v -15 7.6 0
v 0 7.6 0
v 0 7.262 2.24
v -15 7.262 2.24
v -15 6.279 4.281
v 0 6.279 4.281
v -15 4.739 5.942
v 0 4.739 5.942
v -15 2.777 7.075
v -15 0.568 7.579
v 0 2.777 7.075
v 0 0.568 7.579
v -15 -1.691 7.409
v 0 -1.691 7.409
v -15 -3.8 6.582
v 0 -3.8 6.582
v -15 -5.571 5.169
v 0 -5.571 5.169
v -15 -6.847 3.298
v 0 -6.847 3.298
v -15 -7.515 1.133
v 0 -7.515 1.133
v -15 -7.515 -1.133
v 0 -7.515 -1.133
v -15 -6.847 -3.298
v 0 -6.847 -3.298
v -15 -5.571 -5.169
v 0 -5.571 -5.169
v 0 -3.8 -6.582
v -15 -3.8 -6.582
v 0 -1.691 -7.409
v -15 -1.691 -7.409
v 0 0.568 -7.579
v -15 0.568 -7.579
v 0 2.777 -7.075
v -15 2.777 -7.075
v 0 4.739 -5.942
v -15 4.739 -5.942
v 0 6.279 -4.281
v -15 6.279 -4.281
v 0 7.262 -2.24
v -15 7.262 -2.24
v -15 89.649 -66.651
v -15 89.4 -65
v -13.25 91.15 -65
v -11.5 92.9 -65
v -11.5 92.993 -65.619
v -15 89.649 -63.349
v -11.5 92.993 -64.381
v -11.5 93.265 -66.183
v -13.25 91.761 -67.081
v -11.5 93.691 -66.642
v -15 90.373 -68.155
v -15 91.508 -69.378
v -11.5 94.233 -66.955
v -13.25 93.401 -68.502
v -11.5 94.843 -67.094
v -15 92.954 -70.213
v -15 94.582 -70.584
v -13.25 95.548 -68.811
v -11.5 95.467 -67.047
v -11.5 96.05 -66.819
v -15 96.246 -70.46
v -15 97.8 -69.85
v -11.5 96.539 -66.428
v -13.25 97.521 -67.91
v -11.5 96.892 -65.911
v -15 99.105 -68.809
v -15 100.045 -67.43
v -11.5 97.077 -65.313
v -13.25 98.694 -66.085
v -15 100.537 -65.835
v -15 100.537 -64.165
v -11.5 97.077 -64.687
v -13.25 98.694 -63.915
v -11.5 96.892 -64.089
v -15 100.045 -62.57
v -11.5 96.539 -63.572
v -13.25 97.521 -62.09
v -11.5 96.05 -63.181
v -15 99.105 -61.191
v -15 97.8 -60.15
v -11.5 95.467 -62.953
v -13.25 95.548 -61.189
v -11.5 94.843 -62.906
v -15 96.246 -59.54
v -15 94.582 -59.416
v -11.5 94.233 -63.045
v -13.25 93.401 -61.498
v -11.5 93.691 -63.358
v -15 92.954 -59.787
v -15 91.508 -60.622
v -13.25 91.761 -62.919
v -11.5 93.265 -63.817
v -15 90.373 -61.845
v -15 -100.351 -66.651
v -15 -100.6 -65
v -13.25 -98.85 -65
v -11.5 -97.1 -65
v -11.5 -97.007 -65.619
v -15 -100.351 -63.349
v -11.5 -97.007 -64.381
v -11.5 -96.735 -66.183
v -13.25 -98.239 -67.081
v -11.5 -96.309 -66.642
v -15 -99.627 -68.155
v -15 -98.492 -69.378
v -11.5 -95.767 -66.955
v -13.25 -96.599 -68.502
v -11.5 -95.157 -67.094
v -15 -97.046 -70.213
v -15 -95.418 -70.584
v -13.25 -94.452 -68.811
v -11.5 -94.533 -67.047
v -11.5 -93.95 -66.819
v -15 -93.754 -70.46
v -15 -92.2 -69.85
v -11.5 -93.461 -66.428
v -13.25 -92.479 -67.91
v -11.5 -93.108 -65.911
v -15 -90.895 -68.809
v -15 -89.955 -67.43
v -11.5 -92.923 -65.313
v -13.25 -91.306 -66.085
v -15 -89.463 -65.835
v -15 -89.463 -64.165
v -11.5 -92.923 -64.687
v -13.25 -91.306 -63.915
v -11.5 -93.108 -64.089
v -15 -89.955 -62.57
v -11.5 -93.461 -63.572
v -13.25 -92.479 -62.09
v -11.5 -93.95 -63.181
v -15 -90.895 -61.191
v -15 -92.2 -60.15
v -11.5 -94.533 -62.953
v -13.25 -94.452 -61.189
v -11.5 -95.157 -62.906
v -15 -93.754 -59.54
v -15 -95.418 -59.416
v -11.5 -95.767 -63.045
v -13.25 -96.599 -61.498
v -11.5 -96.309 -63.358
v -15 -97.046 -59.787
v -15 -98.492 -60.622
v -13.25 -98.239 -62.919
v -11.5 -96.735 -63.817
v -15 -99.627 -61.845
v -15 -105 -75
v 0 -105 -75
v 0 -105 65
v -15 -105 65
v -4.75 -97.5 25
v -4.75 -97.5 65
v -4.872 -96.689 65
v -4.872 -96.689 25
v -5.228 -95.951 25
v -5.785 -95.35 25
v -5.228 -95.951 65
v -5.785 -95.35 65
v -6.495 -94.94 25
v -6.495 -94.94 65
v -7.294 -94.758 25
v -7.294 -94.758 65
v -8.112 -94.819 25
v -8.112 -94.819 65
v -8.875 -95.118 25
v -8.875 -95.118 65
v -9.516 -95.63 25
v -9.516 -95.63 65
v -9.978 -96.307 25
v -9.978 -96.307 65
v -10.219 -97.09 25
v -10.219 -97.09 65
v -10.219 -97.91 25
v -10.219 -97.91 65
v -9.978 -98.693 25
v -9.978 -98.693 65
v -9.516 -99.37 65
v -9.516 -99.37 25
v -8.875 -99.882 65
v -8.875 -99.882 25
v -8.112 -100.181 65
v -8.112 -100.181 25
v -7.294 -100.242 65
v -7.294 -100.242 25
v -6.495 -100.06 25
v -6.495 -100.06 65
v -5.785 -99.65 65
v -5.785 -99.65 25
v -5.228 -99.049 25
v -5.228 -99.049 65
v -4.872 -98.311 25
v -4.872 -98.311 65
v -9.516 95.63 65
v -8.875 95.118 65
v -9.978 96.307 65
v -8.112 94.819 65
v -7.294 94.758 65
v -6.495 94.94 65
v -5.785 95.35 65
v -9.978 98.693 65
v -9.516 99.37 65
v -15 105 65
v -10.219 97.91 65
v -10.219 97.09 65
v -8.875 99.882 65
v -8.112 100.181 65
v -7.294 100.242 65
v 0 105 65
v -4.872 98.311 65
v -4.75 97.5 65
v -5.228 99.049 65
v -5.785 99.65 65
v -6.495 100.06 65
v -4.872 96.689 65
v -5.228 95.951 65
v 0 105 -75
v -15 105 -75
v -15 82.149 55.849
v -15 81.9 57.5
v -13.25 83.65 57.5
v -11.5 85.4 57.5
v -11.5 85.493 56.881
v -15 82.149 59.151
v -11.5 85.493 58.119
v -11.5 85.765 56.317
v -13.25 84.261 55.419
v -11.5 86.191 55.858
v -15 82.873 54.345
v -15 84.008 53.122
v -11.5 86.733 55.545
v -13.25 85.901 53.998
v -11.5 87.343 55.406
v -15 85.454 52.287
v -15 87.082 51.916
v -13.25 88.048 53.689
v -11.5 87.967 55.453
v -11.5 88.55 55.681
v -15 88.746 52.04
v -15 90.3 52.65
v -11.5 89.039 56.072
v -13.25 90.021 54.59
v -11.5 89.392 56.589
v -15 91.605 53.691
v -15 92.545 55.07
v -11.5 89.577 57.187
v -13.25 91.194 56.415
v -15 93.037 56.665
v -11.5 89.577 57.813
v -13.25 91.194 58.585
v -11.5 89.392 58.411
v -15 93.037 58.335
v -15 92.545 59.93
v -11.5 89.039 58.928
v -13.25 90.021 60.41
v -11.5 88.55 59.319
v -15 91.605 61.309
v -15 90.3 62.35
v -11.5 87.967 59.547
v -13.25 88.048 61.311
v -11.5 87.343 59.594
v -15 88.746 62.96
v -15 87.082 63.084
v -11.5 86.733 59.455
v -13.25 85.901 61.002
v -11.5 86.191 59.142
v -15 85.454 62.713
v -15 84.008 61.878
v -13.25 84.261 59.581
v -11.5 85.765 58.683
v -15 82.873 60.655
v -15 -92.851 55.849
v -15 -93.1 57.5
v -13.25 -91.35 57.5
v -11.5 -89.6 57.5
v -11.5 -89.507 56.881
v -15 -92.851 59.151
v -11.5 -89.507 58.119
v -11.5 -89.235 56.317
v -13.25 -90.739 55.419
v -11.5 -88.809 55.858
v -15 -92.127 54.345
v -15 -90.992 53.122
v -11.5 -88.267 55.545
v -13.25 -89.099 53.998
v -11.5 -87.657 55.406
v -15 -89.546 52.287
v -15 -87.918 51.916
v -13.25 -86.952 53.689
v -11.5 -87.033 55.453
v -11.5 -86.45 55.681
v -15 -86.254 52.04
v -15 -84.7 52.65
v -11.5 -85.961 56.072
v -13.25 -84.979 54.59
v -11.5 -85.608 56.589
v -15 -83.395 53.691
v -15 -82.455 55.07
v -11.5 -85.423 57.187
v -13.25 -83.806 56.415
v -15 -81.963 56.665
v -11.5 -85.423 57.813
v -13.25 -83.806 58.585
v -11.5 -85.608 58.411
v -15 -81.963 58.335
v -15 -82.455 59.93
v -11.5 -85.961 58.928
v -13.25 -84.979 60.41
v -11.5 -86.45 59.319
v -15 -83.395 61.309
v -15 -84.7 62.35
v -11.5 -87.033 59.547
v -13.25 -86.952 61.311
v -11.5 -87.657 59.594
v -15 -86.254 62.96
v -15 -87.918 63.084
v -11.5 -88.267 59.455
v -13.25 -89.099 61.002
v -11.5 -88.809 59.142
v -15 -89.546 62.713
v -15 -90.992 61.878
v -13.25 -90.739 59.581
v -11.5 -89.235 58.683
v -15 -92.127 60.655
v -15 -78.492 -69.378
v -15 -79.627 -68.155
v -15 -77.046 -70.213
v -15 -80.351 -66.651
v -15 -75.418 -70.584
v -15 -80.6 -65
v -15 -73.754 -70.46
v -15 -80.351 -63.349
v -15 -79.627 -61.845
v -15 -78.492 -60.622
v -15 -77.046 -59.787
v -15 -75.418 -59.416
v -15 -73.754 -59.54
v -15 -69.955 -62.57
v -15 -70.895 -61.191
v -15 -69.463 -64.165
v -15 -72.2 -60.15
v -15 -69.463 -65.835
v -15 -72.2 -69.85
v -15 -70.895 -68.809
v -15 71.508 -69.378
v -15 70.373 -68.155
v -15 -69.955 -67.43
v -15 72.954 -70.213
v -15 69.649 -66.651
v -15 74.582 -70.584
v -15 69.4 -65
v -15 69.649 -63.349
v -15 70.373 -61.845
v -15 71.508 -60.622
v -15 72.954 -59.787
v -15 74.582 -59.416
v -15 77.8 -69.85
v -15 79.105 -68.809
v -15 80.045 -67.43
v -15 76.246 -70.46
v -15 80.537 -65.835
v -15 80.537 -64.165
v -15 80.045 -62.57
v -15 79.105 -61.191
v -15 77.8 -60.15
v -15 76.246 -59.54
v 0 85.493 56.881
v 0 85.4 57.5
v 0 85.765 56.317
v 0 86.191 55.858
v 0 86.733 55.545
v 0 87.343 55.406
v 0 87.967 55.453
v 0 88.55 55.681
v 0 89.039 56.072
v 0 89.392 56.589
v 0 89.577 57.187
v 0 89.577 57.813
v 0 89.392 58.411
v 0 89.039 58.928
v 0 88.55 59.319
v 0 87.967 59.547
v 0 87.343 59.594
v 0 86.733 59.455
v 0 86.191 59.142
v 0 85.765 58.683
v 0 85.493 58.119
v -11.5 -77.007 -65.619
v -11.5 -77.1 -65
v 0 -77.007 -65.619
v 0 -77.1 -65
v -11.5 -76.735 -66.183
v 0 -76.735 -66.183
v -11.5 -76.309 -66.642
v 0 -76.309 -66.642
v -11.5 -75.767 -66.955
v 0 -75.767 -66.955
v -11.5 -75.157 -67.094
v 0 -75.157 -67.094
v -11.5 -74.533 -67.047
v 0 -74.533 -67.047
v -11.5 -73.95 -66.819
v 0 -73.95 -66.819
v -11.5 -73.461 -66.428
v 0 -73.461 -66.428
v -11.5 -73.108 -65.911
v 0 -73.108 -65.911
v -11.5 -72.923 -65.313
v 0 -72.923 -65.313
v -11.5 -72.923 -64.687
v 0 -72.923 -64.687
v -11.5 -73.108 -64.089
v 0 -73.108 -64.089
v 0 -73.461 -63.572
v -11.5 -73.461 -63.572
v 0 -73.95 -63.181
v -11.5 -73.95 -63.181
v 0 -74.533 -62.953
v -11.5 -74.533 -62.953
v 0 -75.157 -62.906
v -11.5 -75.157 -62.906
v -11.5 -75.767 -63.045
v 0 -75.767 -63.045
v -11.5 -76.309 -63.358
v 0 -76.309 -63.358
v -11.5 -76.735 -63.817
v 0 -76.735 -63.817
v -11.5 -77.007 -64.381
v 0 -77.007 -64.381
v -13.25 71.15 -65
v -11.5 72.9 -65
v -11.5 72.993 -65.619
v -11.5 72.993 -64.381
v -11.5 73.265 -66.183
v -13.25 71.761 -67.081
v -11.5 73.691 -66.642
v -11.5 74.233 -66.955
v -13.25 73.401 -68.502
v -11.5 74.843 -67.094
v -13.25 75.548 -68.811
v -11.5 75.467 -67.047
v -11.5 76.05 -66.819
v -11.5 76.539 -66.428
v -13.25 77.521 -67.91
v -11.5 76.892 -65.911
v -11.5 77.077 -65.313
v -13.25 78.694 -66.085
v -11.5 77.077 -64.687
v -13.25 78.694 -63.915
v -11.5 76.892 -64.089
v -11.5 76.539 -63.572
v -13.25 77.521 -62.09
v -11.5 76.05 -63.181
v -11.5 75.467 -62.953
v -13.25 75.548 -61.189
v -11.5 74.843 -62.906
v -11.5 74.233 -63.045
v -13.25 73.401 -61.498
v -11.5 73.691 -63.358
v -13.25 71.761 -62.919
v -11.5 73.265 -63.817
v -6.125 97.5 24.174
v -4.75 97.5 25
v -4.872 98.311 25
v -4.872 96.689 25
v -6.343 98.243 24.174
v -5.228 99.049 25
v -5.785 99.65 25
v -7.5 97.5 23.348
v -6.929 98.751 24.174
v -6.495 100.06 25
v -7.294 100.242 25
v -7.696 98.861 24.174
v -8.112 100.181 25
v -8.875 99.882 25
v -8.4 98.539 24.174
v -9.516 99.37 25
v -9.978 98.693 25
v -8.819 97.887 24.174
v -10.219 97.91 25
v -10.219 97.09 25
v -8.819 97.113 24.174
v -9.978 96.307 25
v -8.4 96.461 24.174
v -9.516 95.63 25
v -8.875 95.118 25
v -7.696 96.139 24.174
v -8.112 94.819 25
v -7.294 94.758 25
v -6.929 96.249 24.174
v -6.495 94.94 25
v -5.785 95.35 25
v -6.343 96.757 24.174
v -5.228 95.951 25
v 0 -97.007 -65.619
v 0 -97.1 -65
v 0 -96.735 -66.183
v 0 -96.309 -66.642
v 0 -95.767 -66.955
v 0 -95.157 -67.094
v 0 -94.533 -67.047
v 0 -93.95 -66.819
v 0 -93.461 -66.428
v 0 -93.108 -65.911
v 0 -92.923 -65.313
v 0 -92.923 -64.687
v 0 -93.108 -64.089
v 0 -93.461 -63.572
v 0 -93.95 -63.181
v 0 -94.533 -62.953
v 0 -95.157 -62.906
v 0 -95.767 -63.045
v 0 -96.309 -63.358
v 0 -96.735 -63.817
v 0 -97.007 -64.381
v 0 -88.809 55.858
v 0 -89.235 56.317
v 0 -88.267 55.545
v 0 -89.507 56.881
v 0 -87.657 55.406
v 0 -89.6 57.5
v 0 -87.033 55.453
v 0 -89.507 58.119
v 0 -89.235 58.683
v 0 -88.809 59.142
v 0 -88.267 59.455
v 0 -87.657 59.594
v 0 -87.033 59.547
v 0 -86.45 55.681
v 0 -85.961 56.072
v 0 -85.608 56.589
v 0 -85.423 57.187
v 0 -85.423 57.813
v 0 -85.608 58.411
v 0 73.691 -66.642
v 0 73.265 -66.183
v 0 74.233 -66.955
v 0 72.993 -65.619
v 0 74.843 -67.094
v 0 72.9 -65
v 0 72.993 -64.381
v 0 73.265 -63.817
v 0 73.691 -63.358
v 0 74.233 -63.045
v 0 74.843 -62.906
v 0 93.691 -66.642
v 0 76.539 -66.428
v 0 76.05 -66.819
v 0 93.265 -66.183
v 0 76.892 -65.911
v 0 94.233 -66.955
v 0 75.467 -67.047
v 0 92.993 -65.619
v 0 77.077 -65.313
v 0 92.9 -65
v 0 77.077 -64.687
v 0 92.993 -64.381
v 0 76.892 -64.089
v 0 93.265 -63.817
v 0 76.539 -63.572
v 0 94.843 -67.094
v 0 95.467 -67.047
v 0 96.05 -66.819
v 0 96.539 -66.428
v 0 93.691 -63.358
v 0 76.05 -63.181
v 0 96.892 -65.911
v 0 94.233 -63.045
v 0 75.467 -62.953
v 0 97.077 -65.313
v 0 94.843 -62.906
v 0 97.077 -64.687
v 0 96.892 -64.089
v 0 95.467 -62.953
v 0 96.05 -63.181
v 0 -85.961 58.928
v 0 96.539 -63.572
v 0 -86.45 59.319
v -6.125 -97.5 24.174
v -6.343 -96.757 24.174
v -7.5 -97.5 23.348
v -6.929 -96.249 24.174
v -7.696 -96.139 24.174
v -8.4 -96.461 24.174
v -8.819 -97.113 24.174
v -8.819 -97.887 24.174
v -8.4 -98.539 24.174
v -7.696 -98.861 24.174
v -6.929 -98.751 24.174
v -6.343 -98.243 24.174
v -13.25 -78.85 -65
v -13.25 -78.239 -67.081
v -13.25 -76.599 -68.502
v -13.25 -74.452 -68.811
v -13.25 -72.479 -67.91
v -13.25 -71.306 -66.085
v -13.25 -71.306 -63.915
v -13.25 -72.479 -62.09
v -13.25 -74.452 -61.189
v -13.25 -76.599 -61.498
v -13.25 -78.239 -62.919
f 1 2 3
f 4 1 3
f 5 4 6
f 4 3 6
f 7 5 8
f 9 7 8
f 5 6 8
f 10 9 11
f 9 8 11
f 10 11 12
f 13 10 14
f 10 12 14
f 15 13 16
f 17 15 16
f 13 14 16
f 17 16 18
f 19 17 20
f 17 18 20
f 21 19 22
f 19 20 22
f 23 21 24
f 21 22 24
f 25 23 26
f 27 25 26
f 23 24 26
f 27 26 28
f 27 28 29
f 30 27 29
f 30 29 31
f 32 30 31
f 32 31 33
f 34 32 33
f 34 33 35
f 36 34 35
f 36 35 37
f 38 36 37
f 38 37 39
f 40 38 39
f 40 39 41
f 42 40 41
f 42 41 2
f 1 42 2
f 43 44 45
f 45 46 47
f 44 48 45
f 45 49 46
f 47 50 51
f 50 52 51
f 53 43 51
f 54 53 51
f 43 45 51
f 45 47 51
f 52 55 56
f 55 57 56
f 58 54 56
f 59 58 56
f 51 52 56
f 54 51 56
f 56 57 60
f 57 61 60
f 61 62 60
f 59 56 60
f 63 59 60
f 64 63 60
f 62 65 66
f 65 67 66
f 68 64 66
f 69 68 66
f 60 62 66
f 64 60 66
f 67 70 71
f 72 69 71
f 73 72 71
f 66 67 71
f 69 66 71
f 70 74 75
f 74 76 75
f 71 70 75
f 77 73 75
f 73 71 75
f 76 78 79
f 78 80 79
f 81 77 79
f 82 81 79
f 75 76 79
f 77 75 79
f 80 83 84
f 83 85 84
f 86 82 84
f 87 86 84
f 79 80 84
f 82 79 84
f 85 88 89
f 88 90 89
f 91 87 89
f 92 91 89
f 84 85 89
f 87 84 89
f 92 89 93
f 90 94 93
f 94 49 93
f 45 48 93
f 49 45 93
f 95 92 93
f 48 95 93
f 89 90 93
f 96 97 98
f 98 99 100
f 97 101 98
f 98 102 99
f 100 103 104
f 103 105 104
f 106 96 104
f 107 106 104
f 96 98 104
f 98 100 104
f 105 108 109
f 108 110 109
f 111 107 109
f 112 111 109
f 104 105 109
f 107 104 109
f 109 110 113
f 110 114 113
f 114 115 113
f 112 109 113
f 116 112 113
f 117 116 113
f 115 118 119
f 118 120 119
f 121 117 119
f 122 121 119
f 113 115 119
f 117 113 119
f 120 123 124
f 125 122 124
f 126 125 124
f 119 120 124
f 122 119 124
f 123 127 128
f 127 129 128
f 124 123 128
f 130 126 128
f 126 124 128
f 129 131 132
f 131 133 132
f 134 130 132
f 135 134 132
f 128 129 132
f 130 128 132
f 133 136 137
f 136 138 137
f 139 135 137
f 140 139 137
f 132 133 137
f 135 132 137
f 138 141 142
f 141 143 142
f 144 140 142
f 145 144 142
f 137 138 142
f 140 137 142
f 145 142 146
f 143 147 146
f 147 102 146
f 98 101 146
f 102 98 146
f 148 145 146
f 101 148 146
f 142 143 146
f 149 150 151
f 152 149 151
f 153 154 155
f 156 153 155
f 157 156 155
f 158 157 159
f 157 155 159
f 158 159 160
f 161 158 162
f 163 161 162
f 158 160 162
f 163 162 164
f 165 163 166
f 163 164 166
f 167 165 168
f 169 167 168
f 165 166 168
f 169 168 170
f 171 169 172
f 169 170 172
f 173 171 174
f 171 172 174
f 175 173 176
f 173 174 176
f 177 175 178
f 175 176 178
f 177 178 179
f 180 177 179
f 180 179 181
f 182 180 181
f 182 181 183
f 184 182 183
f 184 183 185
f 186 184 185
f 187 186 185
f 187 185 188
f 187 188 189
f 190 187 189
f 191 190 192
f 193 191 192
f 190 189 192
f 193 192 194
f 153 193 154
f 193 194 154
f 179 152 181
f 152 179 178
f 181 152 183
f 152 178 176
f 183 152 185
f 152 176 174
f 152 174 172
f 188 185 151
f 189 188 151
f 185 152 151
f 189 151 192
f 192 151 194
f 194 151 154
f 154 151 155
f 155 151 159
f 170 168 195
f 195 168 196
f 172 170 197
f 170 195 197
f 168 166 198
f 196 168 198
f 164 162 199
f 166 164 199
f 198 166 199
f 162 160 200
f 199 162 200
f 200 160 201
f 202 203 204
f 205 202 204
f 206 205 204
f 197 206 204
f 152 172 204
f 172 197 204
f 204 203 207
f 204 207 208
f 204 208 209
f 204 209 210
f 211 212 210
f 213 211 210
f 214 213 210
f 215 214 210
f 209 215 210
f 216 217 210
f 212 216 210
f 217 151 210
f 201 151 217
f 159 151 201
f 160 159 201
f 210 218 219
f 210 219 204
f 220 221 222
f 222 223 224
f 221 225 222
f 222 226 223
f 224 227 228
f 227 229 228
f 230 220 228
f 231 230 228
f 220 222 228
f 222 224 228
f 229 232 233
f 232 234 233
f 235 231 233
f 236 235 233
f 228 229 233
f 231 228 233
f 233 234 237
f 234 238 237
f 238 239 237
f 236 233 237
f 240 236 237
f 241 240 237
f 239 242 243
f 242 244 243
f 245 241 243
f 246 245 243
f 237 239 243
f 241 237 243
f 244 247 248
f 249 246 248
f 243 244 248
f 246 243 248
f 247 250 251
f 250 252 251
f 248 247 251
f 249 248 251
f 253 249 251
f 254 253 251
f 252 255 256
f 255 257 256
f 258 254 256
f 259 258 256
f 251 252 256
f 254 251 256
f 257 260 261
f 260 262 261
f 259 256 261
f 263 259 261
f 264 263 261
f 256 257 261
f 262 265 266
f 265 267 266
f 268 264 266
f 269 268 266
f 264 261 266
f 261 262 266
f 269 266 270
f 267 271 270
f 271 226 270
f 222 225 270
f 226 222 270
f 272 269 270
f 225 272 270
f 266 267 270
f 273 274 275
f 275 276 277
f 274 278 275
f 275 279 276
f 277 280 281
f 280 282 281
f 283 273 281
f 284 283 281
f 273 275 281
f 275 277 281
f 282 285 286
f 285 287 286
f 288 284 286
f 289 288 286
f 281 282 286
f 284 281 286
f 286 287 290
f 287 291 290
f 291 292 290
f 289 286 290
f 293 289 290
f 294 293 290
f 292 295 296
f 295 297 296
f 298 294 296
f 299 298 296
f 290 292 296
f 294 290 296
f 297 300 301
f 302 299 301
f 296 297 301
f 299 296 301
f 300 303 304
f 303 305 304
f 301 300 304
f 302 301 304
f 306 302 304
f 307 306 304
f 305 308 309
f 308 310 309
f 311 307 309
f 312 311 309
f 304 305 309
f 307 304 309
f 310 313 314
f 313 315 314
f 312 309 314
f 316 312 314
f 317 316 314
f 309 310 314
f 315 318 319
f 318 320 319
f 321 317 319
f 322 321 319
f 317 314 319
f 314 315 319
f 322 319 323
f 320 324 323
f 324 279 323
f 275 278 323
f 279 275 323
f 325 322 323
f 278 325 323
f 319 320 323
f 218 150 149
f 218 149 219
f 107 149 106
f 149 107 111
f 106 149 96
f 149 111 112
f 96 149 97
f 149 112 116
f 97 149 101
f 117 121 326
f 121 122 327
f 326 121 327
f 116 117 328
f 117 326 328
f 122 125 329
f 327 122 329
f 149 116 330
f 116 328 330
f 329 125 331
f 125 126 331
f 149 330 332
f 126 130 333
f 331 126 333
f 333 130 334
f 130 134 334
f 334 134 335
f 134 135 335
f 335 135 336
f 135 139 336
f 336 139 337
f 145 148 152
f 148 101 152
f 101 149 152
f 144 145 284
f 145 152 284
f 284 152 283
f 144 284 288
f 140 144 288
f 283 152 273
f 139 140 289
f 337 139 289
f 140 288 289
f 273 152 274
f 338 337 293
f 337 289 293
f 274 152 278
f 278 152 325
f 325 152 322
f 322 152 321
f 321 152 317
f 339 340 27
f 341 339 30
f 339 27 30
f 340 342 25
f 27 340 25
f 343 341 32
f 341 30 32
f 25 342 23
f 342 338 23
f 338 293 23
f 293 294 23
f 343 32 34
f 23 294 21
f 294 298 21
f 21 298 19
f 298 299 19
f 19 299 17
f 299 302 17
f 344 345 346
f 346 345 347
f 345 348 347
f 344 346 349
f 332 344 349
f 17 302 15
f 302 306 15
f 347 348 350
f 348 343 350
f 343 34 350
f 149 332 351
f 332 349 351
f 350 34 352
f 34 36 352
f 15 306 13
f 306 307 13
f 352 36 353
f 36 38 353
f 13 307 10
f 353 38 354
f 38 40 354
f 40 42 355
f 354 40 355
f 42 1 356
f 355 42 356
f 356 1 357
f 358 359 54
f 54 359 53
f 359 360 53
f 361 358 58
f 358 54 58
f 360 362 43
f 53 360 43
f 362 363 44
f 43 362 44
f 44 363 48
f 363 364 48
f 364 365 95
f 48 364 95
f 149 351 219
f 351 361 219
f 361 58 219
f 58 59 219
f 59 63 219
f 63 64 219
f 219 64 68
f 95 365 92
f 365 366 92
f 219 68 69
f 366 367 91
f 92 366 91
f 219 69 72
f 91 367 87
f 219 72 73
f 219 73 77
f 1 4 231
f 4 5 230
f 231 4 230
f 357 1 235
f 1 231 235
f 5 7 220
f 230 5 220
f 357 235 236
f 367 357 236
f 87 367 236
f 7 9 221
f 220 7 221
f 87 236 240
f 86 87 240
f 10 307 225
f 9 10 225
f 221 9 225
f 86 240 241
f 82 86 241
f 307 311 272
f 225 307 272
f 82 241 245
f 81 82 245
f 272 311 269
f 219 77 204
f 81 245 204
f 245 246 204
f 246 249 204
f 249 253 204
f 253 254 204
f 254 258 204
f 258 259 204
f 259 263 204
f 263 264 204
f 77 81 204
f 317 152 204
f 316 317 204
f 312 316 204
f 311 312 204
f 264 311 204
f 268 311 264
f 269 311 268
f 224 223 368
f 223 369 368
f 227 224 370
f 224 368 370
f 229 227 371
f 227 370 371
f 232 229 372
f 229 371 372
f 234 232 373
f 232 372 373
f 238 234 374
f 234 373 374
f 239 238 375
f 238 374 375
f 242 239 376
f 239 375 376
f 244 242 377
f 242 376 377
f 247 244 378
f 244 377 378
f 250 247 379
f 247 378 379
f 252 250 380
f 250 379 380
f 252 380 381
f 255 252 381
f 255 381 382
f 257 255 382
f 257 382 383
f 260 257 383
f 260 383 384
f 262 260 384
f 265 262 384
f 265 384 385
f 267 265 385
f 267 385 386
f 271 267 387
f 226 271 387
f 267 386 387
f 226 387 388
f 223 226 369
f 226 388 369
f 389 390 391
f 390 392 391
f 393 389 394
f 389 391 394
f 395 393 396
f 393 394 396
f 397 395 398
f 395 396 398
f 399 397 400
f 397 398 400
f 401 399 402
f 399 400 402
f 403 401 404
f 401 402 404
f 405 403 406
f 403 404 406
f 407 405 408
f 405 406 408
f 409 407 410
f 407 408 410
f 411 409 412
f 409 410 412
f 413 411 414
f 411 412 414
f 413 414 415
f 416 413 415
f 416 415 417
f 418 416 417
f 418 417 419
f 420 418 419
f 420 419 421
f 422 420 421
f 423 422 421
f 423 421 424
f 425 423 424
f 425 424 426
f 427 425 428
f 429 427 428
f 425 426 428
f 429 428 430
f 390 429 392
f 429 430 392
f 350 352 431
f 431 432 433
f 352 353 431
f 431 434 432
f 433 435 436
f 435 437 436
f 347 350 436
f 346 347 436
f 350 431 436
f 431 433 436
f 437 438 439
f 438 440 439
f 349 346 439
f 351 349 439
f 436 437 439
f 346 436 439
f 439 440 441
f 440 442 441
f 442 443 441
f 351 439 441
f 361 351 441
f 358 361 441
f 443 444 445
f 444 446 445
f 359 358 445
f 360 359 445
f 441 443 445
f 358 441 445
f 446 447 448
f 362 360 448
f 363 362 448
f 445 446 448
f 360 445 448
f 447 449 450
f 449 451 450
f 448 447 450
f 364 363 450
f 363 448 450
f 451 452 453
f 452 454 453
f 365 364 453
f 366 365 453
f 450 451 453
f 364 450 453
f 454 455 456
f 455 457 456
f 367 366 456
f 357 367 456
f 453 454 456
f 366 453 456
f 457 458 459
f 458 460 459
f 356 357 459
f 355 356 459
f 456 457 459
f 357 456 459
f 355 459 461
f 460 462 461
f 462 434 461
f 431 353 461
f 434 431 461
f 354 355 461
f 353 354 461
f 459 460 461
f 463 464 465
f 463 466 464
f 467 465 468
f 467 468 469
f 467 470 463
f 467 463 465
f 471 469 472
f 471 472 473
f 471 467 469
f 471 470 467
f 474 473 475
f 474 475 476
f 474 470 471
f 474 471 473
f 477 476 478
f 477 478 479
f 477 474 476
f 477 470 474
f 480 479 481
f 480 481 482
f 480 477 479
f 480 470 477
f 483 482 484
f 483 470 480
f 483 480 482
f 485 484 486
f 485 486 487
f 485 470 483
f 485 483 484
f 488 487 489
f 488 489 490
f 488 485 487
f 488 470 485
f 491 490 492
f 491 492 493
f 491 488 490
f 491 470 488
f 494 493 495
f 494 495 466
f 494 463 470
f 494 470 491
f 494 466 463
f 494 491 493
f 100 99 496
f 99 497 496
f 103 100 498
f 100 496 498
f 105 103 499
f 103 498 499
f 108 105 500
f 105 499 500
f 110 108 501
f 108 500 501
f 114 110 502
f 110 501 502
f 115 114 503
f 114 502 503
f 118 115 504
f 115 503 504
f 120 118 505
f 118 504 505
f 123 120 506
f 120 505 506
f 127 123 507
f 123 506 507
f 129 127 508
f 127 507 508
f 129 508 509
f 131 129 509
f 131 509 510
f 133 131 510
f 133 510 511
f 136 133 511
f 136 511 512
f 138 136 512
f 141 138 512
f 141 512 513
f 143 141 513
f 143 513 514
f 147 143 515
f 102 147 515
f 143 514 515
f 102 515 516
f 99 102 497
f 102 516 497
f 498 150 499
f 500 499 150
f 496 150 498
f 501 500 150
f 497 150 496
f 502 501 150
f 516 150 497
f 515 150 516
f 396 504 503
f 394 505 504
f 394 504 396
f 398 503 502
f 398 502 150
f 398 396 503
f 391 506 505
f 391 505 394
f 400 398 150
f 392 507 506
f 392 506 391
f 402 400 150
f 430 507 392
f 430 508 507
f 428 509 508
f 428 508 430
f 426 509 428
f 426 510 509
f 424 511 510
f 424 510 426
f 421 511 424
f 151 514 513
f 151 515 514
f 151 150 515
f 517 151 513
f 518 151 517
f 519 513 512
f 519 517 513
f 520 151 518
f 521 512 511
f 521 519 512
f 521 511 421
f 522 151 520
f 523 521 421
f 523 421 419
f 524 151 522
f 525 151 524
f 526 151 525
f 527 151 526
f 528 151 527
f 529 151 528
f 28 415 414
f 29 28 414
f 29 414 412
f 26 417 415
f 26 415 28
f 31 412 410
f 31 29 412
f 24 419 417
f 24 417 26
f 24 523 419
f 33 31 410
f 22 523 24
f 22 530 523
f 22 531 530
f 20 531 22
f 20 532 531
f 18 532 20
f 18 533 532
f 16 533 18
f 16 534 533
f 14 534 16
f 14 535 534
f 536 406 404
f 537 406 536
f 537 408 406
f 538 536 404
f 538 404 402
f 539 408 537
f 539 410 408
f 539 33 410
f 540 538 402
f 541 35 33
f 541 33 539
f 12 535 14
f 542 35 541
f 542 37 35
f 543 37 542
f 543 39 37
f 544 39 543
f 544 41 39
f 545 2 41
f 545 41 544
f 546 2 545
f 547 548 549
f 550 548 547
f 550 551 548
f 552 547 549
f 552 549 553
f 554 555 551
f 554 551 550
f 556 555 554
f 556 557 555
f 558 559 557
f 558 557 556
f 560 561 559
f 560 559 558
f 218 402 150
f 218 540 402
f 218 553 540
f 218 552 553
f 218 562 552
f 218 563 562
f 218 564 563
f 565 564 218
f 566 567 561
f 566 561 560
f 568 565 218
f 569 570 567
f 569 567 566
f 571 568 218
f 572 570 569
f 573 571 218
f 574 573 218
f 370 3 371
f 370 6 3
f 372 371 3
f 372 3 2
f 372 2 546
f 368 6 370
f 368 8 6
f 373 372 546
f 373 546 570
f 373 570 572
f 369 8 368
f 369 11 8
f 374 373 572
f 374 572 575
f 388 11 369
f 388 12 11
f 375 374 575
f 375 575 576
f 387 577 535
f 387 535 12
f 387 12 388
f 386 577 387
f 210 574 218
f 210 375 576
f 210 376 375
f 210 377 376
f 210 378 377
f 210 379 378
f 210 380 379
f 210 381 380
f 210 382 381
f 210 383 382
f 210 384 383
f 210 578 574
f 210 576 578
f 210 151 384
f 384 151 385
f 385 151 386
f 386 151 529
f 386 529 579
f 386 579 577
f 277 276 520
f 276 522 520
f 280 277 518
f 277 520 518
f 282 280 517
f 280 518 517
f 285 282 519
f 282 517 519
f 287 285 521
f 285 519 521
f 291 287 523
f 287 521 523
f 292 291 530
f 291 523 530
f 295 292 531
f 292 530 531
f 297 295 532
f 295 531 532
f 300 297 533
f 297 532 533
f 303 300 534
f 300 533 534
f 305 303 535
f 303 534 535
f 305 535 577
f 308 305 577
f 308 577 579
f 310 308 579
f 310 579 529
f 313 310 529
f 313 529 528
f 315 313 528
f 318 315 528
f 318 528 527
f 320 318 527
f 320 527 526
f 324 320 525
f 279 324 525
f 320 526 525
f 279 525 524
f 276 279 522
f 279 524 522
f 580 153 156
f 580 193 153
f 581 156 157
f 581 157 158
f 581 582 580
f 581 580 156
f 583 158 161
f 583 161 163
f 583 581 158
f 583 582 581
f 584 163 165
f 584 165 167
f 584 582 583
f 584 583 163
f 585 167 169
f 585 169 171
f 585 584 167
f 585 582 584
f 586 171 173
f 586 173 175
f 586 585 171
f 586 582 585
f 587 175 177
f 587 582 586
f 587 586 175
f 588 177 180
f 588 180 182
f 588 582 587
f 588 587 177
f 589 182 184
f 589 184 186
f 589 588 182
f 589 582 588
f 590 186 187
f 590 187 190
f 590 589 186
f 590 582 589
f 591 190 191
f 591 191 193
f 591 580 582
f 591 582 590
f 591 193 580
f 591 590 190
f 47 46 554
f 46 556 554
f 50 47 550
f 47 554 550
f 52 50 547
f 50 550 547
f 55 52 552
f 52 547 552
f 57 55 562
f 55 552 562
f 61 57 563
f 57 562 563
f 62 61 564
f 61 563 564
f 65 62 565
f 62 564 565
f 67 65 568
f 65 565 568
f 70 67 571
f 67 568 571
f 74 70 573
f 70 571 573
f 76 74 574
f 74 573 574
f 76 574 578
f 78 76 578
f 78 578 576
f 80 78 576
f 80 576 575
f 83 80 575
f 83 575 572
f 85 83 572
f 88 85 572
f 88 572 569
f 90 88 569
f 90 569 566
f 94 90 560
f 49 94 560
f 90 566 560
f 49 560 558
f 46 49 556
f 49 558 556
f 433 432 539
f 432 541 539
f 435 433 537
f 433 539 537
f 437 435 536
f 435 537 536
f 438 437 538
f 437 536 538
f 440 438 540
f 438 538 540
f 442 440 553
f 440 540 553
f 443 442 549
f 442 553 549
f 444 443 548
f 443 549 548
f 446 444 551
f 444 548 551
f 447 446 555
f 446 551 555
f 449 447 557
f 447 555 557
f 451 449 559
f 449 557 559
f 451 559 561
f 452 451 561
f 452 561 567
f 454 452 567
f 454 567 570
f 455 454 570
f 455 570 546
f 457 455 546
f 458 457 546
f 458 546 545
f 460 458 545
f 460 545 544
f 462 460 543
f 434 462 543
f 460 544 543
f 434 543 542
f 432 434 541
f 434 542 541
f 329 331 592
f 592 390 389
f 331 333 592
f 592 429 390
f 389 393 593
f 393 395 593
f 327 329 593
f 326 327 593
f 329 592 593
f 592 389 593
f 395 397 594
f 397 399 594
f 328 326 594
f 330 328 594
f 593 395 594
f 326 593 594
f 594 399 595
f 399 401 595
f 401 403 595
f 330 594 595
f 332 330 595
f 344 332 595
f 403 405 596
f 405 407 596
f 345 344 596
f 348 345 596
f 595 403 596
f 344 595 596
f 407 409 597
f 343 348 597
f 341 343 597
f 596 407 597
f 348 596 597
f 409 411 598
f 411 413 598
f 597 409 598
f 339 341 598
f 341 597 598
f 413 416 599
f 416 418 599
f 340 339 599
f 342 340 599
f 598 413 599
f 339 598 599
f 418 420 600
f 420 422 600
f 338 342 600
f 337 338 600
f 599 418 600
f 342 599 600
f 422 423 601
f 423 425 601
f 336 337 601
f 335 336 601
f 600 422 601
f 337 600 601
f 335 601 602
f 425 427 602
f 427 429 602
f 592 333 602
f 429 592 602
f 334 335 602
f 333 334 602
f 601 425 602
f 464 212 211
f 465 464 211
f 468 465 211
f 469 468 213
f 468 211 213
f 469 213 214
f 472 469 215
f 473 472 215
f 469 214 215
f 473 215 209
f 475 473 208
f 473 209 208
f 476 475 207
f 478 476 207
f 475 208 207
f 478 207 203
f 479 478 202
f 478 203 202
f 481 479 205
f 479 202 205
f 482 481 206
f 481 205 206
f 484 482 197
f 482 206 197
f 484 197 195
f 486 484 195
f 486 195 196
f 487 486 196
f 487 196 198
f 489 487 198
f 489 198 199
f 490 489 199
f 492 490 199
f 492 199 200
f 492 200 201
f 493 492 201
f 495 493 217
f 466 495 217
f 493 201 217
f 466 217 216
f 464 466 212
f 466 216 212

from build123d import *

# Parameters (mm, degrees)
SKETCH024_W         = 210
SKETCH024_H         = 140
PAD014_DEPTH        = 15
SKETCH025_R         = 7.6
POCKET006_DEPTH     = 35
HOLE004_D           = 4.2
HOLE004_DEPTH       = 25
HOLE004_CSINK_D     = 11.2
HOLE004_CSINK_ANGLE = 90
SKETCH029_R         = 2.75
HOLE007_DEPTH       = 40
HOLE007_TIPS_R      = 2.75


with BuildPart() as part:
    # Sketch024 → Pad014 (new body)
    with BuildSketch(Plane.YZ):
        with Locations((0, -5)):
            Rectangle(SKETCH024_W, SKETCH024_H)
    extrude(amount=-PAD014_DEPTH)

    # Sketch025 → Pocket006 (cut)
    with BuildSketch(Plane.YZ):
        Circle(SKETCH025_R)
    extrude(amount=-POCKET006_DEPTH, mode=Mode.SUBTRACT)

    # Hole004
    with Locations(Plane(origin=(-15, 0, 0), x_dir=(0, 1, 0), z_dir=(-1, 0, 0))):
        with Locations((-95, 65), (-75, 65), (95, 65), (75, 65), (-87.5, -57.5), (87.5, -57.5)):
            CounterSinkHole(HOLE004_D / 2, HOLE004_CSINK_D / 2, depth=HOLE004_DEPTH, counter_sink_angle=HOLE004_CSINK_ANGLE)

    # Sketch029 → Hole007 (cut)
    with BuildSketch(Plane.XY.offset(65)):
        with Locations((-7.5, -97.5)):
            Circle(SKETCH029_R)
        with Locations((-7.5, 97.5)):
            Circle(SKETCH029_R)
    extrude(amount=-HOLE007_DEPTH, mode=Mode.SUBTRACT)

    # Hole007 tips → Hole007 tip 1 section 0
    with BuildSketch(Plane.XY.offset(25), mode=Mode.PRIVATE) as hole007_tip_1_s0:
        with Locations((-7.5, -97.5)):
            Circle(HOLE007_TIPS_R)
    loft([hole007_tip_1_s0.sketch, Vertex(-7.5, -97.5, 23.347633)], mode=Mode.SUBTRACT)

    # Hole007 tips → Hole007 tip 2 section 0
    with BuildSketch(Plane.XY.offset(25), mode=Mode.PRIVATE) as hole007_tip_2_s0:
        with Locations((-7.5, 97.5)):
            Circle(HOLE007_TIPS_R)
    loft([hole007_tip_2_s0.sketch, Vertex(-7.5, 97.5, 23.347633)], mode=Mode.SUBTRACT)


solid = part.part
